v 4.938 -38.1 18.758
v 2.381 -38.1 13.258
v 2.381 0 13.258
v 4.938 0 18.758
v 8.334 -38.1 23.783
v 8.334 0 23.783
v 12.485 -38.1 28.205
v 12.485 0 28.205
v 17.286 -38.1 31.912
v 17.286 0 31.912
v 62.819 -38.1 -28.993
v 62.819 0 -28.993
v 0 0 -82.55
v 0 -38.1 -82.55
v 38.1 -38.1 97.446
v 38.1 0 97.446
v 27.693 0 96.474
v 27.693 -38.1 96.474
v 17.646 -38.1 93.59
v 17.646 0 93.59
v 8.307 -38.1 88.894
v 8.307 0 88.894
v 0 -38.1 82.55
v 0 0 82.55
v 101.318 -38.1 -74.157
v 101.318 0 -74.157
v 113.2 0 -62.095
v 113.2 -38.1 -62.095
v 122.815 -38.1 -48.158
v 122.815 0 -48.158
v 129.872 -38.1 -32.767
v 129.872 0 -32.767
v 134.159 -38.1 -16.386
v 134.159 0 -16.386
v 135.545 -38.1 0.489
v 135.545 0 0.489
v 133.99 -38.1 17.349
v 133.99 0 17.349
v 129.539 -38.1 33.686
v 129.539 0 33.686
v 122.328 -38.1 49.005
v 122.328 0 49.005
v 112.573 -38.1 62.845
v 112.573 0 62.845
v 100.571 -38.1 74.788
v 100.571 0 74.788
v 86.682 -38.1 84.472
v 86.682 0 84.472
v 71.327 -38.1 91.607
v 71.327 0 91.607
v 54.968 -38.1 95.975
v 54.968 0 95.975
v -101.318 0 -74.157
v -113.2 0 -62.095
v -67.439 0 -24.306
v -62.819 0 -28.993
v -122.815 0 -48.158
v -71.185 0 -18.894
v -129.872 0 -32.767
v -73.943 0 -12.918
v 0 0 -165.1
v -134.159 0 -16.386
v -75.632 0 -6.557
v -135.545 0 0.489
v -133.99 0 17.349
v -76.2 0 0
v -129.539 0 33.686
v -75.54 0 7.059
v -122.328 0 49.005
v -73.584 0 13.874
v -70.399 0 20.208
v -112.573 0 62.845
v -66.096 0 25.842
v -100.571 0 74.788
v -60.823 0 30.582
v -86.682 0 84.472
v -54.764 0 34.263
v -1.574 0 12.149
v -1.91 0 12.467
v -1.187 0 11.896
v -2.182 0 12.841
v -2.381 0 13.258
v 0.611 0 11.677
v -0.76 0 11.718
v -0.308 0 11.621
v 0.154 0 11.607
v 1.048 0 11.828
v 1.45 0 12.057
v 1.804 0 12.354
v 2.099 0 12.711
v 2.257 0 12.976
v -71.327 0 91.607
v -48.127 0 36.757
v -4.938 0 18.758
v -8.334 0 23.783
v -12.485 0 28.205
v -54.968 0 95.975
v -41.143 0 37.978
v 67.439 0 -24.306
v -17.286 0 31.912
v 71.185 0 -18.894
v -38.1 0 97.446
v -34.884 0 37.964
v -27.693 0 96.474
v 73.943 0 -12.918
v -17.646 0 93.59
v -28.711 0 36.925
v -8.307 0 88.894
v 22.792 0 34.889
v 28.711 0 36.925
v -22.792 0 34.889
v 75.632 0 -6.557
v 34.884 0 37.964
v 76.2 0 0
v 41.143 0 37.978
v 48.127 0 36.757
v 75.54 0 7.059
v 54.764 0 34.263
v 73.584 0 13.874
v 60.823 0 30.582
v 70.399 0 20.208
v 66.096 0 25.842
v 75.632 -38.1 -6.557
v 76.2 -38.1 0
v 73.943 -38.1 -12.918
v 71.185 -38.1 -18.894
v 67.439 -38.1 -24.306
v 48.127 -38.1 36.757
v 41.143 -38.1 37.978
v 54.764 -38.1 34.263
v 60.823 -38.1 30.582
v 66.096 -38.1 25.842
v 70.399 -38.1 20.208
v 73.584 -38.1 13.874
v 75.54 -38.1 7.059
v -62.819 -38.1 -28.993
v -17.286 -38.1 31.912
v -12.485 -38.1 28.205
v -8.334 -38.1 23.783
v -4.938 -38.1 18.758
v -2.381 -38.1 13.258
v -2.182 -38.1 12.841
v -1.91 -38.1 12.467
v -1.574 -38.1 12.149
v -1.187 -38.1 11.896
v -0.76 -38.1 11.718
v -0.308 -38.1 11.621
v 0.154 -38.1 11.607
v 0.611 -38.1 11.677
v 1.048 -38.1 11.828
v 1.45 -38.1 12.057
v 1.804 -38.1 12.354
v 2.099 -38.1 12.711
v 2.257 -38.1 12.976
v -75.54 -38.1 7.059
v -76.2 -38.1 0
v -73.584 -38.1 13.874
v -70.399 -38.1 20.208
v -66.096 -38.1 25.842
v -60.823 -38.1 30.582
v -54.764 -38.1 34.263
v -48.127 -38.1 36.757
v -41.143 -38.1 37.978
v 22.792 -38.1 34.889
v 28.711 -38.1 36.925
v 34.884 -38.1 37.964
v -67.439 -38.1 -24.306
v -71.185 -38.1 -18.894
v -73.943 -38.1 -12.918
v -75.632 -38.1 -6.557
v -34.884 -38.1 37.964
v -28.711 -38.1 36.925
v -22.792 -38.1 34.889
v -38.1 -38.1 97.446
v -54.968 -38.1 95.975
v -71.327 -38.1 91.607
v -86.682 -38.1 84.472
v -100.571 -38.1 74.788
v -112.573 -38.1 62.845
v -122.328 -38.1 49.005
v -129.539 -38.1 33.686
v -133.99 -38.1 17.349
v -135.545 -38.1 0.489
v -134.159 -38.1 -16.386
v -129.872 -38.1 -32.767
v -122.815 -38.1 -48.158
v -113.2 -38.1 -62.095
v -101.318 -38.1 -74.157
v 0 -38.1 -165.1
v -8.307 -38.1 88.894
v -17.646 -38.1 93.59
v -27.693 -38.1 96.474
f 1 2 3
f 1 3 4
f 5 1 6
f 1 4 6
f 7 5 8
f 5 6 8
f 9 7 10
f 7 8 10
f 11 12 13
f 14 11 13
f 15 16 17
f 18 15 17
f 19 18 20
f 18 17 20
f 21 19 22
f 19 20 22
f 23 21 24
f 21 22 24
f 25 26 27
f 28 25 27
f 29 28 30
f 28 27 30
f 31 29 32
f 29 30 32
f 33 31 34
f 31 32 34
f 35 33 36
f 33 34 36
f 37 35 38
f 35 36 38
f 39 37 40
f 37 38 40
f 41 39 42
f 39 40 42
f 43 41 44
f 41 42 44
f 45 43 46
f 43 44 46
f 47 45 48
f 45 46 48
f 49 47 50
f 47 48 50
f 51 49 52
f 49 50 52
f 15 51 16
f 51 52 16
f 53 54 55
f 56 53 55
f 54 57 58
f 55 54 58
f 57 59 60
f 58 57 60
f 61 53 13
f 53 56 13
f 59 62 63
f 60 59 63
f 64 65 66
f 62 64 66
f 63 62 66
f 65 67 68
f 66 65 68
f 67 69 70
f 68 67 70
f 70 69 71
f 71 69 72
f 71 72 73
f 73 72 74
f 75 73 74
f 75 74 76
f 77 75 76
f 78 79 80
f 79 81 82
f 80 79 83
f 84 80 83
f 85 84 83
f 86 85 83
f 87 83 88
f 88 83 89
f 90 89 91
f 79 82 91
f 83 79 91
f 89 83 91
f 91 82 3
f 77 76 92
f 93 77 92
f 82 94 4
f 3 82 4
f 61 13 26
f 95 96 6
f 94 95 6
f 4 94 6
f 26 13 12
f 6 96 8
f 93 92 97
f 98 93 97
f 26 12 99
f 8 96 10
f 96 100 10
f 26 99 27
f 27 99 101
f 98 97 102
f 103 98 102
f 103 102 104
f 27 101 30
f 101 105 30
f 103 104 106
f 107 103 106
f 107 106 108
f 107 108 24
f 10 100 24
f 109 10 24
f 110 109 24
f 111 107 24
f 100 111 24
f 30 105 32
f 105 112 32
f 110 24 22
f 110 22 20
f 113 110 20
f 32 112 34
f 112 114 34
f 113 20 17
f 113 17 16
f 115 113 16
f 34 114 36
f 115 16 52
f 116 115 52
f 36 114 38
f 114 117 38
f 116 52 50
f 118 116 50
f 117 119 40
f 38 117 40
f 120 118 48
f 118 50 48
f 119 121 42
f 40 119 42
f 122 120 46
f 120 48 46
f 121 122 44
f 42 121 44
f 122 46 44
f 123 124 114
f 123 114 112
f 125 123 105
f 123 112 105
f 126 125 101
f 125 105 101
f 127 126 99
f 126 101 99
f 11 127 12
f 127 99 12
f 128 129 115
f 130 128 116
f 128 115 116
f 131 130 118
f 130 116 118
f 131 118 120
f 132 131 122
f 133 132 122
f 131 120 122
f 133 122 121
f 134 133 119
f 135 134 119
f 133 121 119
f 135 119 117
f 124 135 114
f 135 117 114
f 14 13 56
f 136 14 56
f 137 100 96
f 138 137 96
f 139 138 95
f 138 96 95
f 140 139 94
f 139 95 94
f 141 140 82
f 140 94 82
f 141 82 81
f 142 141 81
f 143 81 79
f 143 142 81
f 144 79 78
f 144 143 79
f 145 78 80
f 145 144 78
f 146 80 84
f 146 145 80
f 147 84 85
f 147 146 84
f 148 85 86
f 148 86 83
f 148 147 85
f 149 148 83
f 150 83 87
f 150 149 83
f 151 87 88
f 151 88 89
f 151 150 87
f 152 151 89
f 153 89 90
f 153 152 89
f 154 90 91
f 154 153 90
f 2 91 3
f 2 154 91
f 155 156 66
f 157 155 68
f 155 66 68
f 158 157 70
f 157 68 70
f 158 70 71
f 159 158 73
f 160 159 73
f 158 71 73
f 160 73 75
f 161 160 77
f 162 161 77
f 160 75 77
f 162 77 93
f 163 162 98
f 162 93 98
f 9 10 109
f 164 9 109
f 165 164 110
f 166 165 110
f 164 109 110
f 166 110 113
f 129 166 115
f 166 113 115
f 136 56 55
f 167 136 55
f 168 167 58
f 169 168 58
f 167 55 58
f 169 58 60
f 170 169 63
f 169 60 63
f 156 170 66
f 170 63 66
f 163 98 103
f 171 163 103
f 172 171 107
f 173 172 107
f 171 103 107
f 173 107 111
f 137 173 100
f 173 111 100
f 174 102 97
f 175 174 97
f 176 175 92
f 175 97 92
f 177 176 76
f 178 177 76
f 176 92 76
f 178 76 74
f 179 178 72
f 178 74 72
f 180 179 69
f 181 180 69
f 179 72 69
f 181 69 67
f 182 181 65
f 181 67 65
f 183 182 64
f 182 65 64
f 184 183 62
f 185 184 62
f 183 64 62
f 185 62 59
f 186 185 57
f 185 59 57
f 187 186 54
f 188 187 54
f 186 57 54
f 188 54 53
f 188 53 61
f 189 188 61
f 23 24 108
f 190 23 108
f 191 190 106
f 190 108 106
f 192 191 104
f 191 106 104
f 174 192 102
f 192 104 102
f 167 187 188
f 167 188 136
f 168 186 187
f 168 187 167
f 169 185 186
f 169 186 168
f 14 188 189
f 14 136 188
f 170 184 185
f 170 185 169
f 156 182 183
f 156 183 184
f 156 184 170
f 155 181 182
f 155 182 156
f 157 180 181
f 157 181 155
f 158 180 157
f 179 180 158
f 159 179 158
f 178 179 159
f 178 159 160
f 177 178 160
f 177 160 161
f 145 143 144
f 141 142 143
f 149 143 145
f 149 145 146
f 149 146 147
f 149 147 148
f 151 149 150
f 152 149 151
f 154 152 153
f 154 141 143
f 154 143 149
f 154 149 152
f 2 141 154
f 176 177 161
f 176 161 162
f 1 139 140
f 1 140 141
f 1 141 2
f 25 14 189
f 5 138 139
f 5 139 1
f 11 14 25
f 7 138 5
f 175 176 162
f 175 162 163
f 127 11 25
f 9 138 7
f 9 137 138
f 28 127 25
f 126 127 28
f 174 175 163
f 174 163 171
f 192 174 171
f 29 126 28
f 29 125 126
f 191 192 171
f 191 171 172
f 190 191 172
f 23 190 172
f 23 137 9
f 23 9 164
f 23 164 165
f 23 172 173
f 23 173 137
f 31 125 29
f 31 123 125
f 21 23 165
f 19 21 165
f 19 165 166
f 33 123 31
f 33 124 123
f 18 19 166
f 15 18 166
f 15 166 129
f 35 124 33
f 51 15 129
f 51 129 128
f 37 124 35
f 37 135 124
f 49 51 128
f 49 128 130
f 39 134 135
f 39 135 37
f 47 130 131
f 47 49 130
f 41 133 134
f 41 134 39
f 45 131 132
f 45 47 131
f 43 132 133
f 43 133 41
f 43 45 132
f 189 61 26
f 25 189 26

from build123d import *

# Parameters (mm, degrees)
F1_DEPTH = 38.1
F2_R     = 2.54


with BuildPart() as f1:
    # F0 (on Front) → F1 (new body)
    with BuildSketch(Plane.XZ):
        with BuildLine():
            Line((0, -82.55), (-62.818537, -28.993171))
            ThreePointArc((-62.818537, -28.993171), (-72.693253, -15.966117), (-76.2, 0))
            ThreePointArc((-76.2, 0), (-90.414977, 61.72931), (-38.1, 97.446484))
            ThreePointArc((-38.1, 97.446484), (-129.539011, 33.685671), (-101.317971, -74.157302))
            Line((-101.317971, -74.157302), (0, -165.1))
            Line((0, -165.1), (0, -82.55))
        make_face()
        with BuildLine():
            ThreePointArc((76.2, 0), (72.693253, -15.966117), (62.818537, -28.993171))
            Line((62.818537, -28.993171), (0, -82.55))
            Line((0, -82.55), (0, -165.1))
            Line((0, -165.1), (101.317932, -74.157335))
            ThreePointArc((101.317932, -74.157335), (129.53902, 33.685647), (38.1, 97.446484))
            ThreePointArc((38.1, 97.446484), (77.819237, 80.994237), (94.271484, 41.275))
            ThreePointArc((94.271484, 41.275), (89.555656, 18.746107), (76.2, 0))
        make_face()
        with BuildLine():
            ThreePointArc((18.071484, 41.275), (17.874678, 36.577013), (17.285638, 31.911946))
            ThreePointArc((17.285638, 31.911946), (28.71095, 36.925002), (41.143131, 37.978275))
            ThreePointArc((41.143131, 37.978275), (66.096011, 25.842472), (76.2, 0))
            ThreePointArc((76.2, 0), (89.555656, 18.746107), (94.271484, 41.275))
            ThreePointArc((94.271484, 41.275), (77.819237, 80.994237), (38.1, 97.446484))
            ThreePointArc((38.1, 97.446484), (17.64569, 93.589977), (0, 82.55))
            ThreePointArc((0, 82.55), (13.355656, 63.803893), (18.071484, 41.275))
        make_face()
        with BuildLine():
            ThreePointArc((-17.285638, 31.911946), (-4.598976, 18.146388), (0, 0))
            Line((0, 0), (0, 82.55))
            ThreePointArc((0, 82.55), (-15.059611, 59.421388), (-17.285638, 31.911946))
        make_face()
        with BuildLine():
            Line((0, 82.55), (0, 0))
            ThreePointArc((0, 0), (4.598976, 18.146388), (17.285638, 31.911946))
            ThreePointArc((17.285638, 31.911946), (17.874678, 36.577013), (18.071484, 41.275))
            ThreePointArc((18.071484, 41.275), (13.355656, 63.803893), (0, 82.55))
        make_face()
        with BuildLine():
            ThreePointArc((-41.143131, 37.978275), (-28.71095, 36.925002), (-17.285638, 31.911946))
            ThreePointArc((-17.285638, 31.911946), (-15.059611, 59.421388), (0, 82.55))
            ThreePointArc((0, 82.55), (-17.64569, 93.589977), (-38.1, 97.446484))
            ThreePointArc((-38.1, 97.446484), (-90.414977, 61.72931), (-76.2, 0))
            ThreePointArc((-76.2, 0), (-66.096011, 25.842472), (-41.143131, 37.978275))
        make_face()
    extrude(amount=F1_DEPTH)

    # F2
    f2_edges = [f1.edges().sort_by_distance(p)[0] for p in [
        (0, -19.05, 0),
    ]]
    fillet(f2_edges, radius=F2_R)


solid = f1.part
